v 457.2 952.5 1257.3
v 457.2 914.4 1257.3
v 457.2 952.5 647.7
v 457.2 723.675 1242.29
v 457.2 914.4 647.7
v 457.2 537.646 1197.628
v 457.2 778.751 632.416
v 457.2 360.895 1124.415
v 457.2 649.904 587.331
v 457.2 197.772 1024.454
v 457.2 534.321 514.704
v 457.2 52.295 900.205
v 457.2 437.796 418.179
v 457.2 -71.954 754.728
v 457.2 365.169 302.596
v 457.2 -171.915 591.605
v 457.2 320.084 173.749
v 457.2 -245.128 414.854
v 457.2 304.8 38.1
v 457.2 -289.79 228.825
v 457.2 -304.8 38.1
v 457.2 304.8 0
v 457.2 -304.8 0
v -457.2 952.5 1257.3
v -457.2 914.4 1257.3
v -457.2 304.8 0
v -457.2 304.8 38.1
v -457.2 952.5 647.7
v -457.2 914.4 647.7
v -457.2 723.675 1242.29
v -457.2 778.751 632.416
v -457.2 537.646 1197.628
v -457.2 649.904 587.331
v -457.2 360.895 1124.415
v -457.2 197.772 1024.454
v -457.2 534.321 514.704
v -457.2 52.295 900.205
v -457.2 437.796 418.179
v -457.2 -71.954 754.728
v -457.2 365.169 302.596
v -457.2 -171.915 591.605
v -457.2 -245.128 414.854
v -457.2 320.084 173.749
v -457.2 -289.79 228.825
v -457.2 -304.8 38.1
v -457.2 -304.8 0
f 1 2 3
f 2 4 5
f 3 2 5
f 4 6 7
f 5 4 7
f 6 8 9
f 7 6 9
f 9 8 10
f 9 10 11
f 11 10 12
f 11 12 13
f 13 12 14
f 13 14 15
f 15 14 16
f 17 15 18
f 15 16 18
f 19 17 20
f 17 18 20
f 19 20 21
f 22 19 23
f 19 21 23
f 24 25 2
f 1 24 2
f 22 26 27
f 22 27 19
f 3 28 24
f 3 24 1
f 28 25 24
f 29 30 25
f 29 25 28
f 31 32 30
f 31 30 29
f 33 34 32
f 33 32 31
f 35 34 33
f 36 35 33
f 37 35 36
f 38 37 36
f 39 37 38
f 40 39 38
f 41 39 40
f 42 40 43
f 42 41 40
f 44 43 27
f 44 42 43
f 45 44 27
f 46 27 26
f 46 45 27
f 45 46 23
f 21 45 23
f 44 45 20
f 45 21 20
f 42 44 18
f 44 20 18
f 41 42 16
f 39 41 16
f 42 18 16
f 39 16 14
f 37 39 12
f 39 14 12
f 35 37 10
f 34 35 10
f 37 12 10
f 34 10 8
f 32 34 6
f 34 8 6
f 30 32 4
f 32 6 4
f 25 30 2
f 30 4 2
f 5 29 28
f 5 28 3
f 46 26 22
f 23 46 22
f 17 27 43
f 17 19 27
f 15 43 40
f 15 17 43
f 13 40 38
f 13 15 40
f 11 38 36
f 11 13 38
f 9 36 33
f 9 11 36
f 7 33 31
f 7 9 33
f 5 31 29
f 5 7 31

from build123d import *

# Parameters (mm, degrees)
F0_W     = 914.4
F0_H     = 609.6
F1_DEPTH = 38.1
F2_W     = 914.4
F2_H     = 609.6
F3_ANGLE = 90
F4_DEPTH = 38.1


with BuildPart() as f1:
    # F0 (on Top) → F1 (new body)
    with BuildSketch(Plane.XY):
        Rectangle(F0_W, F0_H)
    extrude(amount=F1_DEPTH)

    # F2 (on face) → F3 (revolve)
    with BuildSketch(Plane.XY.offset(38.1)):
        Rectangle(F2_W, F2_H)
    revolve(axis=Axis((-103.2055318356, 914.4, 38.1), (-1, 0, 0)), revolution_arc=F3_ANGLE)

    # F4 (add): a face of the model
    f4_faces = [f1.faces().sort_by_distance(p)[0] for p in [
        (0, 914.4, 952.5),
    ]]
    extrude(f4_faces, amount=F4_DEPTH)


solid = f1.part
